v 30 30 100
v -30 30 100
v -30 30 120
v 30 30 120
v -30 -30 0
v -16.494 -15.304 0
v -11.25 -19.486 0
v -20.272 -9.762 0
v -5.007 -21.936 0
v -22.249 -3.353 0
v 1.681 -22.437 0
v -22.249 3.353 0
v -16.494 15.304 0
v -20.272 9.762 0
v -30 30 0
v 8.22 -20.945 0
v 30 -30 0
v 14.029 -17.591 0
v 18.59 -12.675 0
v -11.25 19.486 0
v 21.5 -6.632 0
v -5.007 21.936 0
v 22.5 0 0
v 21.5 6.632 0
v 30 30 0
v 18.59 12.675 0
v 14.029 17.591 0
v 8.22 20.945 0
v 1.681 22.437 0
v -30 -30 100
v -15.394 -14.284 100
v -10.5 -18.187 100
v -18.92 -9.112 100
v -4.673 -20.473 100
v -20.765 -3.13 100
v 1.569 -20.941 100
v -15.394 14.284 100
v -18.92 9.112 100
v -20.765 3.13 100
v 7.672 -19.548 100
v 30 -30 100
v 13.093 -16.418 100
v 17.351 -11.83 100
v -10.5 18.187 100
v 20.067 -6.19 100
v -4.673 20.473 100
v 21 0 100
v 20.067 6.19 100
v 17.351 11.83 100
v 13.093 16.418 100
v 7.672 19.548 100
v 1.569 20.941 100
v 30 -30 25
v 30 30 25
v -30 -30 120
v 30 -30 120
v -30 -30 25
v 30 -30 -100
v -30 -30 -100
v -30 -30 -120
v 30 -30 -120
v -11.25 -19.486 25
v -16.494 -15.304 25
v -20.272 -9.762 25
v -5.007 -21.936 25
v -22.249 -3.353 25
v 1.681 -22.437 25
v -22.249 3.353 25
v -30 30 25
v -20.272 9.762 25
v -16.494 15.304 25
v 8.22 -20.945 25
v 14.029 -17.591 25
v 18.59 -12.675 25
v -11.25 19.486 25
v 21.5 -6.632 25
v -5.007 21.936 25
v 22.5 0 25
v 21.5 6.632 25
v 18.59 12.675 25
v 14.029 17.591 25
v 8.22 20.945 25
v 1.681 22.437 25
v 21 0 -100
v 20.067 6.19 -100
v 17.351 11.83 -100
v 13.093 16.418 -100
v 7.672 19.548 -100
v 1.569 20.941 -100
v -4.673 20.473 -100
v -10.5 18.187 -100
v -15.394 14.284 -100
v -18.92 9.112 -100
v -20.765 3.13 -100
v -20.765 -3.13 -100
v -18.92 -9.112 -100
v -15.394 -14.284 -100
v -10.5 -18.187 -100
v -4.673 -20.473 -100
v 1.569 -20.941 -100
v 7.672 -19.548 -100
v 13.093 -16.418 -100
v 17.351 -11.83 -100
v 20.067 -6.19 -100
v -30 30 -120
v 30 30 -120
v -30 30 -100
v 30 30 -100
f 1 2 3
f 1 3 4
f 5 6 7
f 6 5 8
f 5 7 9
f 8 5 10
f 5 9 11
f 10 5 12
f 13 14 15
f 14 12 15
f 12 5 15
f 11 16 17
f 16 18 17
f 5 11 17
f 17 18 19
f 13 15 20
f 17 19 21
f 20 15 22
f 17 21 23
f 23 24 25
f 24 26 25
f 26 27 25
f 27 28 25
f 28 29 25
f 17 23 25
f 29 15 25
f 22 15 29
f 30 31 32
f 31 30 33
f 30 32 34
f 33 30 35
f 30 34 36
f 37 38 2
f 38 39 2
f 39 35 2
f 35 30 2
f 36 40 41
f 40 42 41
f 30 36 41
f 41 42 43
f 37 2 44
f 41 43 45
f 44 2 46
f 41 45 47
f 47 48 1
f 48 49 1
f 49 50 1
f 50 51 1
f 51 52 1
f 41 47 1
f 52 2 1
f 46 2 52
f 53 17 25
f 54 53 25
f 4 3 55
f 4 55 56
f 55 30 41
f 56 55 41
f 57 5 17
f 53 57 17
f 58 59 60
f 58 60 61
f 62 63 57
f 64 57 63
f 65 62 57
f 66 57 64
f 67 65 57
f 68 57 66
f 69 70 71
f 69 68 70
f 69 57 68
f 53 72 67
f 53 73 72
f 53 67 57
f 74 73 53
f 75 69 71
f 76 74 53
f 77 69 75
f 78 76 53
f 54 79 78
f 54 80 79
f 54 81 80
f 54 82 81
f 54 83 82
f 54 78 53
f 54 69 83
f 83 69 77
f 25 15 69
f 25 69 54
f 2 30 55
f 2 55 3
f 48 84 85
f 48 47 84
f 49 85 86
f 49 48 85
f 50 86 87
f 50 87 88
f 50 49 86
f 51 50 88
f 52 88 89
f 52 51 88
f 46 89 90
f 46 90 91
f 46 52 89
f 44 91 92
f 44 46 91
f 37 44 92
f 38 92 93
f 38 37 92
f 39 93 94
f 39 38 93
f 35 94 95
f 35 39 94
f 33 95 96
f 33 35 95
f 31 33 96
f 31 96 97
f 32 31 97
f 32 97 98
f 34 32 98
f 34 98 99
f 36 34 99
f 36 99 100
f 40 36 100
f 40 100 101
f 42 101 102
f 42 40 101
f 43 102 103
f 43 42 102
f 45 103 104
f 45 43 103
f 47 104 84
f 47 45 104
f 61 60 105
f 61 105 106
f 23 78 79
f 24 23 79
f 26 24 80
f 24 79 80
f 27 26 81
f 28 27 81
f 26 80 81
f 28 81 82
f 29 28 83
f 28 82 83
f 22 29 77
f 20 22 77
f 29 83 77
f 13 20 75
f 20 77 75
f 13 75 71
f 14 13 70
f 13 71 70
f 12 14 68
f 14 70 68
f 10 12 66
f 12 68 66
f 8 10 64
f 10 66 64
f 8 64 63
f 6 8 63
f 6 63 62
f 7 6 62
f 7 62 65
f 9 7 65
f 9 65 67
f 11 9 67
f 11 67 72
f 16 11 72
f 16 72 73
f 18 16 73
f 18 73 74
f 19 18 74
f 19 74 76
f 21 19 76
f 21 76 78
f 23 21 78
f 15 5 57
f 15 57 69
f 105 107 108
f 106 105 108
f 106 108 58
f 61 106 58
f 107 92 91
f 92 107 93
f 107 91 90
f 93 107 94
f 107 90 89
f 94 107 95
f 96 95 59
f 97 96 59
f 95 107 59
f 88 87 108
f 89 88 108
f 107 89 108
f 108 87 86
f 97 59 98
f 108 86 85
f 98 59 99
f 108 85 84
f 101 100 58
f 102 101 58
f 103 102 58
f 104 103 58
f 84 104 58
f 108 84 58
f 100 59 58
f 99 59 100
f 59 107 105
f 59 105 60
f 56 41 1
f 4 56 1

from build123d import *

# Parameters (mm, degrees)
F0_W     = 60
F0_H     = 60
F1_DEPTH = 25
F2_R     = 22.5
F3_DEPTH = 25.001
F4_R     = 21
F5_DEPTH = 100
F6_W     = 60
F6_H     = 60
F6_R     = 21
F7_DEPTH = 20
F8_W     = 60
F8_H     = 60
F8_R     = 21
F9_DEPTH = 20


with BuildPart() as f1:
    # F0 (on Top) → F1 (new body)
    with BuildSketch(Plane.XY):
        Rectangle(F0_W, F0_H)
    extrude(amount=F1_DEPTH)

    # F2 (on face) → F3 (cut, through all)
    with BuildSketch(Plane.XY.offset(25)):
        Circle(F2_R)
    extrude(amount=-F3_DEPTH, mode=Mode.SUBTRACT)


with BuildPart() as f5:
    # F4 (on Top) → F5 (new body, symmetric)
    with BuildSketch(Plane.XY):
        Circle(F4_R)
    extrude(amount=F5_DEPTH, both=True)

    # F6 (on face) → F7 (join)
    with BuildSketch(Plane.XY.offset(100)):
        Rectangle(F6_W, F6_H)
        Circle(F6_R, mode=Mode.SUBTRACT)
        Circle(F6_R)
    extrude(amount=F7_DEPTH)

    # F8 (on face) → F9 (join)
    with BuildSketch(Plane(origin=(0, 0, -100), x_dir=(1, 0, 0), z_dir=(0, 0, -1))):
        Rectangle(F8_W, F8_H)
        Circle(F8_R, mode=Mode.SUBTRACT)
        Circle(F8_R)
    extrude(amount=F9_DEPTH)


solid = Compound([f1.part, f5.part])
